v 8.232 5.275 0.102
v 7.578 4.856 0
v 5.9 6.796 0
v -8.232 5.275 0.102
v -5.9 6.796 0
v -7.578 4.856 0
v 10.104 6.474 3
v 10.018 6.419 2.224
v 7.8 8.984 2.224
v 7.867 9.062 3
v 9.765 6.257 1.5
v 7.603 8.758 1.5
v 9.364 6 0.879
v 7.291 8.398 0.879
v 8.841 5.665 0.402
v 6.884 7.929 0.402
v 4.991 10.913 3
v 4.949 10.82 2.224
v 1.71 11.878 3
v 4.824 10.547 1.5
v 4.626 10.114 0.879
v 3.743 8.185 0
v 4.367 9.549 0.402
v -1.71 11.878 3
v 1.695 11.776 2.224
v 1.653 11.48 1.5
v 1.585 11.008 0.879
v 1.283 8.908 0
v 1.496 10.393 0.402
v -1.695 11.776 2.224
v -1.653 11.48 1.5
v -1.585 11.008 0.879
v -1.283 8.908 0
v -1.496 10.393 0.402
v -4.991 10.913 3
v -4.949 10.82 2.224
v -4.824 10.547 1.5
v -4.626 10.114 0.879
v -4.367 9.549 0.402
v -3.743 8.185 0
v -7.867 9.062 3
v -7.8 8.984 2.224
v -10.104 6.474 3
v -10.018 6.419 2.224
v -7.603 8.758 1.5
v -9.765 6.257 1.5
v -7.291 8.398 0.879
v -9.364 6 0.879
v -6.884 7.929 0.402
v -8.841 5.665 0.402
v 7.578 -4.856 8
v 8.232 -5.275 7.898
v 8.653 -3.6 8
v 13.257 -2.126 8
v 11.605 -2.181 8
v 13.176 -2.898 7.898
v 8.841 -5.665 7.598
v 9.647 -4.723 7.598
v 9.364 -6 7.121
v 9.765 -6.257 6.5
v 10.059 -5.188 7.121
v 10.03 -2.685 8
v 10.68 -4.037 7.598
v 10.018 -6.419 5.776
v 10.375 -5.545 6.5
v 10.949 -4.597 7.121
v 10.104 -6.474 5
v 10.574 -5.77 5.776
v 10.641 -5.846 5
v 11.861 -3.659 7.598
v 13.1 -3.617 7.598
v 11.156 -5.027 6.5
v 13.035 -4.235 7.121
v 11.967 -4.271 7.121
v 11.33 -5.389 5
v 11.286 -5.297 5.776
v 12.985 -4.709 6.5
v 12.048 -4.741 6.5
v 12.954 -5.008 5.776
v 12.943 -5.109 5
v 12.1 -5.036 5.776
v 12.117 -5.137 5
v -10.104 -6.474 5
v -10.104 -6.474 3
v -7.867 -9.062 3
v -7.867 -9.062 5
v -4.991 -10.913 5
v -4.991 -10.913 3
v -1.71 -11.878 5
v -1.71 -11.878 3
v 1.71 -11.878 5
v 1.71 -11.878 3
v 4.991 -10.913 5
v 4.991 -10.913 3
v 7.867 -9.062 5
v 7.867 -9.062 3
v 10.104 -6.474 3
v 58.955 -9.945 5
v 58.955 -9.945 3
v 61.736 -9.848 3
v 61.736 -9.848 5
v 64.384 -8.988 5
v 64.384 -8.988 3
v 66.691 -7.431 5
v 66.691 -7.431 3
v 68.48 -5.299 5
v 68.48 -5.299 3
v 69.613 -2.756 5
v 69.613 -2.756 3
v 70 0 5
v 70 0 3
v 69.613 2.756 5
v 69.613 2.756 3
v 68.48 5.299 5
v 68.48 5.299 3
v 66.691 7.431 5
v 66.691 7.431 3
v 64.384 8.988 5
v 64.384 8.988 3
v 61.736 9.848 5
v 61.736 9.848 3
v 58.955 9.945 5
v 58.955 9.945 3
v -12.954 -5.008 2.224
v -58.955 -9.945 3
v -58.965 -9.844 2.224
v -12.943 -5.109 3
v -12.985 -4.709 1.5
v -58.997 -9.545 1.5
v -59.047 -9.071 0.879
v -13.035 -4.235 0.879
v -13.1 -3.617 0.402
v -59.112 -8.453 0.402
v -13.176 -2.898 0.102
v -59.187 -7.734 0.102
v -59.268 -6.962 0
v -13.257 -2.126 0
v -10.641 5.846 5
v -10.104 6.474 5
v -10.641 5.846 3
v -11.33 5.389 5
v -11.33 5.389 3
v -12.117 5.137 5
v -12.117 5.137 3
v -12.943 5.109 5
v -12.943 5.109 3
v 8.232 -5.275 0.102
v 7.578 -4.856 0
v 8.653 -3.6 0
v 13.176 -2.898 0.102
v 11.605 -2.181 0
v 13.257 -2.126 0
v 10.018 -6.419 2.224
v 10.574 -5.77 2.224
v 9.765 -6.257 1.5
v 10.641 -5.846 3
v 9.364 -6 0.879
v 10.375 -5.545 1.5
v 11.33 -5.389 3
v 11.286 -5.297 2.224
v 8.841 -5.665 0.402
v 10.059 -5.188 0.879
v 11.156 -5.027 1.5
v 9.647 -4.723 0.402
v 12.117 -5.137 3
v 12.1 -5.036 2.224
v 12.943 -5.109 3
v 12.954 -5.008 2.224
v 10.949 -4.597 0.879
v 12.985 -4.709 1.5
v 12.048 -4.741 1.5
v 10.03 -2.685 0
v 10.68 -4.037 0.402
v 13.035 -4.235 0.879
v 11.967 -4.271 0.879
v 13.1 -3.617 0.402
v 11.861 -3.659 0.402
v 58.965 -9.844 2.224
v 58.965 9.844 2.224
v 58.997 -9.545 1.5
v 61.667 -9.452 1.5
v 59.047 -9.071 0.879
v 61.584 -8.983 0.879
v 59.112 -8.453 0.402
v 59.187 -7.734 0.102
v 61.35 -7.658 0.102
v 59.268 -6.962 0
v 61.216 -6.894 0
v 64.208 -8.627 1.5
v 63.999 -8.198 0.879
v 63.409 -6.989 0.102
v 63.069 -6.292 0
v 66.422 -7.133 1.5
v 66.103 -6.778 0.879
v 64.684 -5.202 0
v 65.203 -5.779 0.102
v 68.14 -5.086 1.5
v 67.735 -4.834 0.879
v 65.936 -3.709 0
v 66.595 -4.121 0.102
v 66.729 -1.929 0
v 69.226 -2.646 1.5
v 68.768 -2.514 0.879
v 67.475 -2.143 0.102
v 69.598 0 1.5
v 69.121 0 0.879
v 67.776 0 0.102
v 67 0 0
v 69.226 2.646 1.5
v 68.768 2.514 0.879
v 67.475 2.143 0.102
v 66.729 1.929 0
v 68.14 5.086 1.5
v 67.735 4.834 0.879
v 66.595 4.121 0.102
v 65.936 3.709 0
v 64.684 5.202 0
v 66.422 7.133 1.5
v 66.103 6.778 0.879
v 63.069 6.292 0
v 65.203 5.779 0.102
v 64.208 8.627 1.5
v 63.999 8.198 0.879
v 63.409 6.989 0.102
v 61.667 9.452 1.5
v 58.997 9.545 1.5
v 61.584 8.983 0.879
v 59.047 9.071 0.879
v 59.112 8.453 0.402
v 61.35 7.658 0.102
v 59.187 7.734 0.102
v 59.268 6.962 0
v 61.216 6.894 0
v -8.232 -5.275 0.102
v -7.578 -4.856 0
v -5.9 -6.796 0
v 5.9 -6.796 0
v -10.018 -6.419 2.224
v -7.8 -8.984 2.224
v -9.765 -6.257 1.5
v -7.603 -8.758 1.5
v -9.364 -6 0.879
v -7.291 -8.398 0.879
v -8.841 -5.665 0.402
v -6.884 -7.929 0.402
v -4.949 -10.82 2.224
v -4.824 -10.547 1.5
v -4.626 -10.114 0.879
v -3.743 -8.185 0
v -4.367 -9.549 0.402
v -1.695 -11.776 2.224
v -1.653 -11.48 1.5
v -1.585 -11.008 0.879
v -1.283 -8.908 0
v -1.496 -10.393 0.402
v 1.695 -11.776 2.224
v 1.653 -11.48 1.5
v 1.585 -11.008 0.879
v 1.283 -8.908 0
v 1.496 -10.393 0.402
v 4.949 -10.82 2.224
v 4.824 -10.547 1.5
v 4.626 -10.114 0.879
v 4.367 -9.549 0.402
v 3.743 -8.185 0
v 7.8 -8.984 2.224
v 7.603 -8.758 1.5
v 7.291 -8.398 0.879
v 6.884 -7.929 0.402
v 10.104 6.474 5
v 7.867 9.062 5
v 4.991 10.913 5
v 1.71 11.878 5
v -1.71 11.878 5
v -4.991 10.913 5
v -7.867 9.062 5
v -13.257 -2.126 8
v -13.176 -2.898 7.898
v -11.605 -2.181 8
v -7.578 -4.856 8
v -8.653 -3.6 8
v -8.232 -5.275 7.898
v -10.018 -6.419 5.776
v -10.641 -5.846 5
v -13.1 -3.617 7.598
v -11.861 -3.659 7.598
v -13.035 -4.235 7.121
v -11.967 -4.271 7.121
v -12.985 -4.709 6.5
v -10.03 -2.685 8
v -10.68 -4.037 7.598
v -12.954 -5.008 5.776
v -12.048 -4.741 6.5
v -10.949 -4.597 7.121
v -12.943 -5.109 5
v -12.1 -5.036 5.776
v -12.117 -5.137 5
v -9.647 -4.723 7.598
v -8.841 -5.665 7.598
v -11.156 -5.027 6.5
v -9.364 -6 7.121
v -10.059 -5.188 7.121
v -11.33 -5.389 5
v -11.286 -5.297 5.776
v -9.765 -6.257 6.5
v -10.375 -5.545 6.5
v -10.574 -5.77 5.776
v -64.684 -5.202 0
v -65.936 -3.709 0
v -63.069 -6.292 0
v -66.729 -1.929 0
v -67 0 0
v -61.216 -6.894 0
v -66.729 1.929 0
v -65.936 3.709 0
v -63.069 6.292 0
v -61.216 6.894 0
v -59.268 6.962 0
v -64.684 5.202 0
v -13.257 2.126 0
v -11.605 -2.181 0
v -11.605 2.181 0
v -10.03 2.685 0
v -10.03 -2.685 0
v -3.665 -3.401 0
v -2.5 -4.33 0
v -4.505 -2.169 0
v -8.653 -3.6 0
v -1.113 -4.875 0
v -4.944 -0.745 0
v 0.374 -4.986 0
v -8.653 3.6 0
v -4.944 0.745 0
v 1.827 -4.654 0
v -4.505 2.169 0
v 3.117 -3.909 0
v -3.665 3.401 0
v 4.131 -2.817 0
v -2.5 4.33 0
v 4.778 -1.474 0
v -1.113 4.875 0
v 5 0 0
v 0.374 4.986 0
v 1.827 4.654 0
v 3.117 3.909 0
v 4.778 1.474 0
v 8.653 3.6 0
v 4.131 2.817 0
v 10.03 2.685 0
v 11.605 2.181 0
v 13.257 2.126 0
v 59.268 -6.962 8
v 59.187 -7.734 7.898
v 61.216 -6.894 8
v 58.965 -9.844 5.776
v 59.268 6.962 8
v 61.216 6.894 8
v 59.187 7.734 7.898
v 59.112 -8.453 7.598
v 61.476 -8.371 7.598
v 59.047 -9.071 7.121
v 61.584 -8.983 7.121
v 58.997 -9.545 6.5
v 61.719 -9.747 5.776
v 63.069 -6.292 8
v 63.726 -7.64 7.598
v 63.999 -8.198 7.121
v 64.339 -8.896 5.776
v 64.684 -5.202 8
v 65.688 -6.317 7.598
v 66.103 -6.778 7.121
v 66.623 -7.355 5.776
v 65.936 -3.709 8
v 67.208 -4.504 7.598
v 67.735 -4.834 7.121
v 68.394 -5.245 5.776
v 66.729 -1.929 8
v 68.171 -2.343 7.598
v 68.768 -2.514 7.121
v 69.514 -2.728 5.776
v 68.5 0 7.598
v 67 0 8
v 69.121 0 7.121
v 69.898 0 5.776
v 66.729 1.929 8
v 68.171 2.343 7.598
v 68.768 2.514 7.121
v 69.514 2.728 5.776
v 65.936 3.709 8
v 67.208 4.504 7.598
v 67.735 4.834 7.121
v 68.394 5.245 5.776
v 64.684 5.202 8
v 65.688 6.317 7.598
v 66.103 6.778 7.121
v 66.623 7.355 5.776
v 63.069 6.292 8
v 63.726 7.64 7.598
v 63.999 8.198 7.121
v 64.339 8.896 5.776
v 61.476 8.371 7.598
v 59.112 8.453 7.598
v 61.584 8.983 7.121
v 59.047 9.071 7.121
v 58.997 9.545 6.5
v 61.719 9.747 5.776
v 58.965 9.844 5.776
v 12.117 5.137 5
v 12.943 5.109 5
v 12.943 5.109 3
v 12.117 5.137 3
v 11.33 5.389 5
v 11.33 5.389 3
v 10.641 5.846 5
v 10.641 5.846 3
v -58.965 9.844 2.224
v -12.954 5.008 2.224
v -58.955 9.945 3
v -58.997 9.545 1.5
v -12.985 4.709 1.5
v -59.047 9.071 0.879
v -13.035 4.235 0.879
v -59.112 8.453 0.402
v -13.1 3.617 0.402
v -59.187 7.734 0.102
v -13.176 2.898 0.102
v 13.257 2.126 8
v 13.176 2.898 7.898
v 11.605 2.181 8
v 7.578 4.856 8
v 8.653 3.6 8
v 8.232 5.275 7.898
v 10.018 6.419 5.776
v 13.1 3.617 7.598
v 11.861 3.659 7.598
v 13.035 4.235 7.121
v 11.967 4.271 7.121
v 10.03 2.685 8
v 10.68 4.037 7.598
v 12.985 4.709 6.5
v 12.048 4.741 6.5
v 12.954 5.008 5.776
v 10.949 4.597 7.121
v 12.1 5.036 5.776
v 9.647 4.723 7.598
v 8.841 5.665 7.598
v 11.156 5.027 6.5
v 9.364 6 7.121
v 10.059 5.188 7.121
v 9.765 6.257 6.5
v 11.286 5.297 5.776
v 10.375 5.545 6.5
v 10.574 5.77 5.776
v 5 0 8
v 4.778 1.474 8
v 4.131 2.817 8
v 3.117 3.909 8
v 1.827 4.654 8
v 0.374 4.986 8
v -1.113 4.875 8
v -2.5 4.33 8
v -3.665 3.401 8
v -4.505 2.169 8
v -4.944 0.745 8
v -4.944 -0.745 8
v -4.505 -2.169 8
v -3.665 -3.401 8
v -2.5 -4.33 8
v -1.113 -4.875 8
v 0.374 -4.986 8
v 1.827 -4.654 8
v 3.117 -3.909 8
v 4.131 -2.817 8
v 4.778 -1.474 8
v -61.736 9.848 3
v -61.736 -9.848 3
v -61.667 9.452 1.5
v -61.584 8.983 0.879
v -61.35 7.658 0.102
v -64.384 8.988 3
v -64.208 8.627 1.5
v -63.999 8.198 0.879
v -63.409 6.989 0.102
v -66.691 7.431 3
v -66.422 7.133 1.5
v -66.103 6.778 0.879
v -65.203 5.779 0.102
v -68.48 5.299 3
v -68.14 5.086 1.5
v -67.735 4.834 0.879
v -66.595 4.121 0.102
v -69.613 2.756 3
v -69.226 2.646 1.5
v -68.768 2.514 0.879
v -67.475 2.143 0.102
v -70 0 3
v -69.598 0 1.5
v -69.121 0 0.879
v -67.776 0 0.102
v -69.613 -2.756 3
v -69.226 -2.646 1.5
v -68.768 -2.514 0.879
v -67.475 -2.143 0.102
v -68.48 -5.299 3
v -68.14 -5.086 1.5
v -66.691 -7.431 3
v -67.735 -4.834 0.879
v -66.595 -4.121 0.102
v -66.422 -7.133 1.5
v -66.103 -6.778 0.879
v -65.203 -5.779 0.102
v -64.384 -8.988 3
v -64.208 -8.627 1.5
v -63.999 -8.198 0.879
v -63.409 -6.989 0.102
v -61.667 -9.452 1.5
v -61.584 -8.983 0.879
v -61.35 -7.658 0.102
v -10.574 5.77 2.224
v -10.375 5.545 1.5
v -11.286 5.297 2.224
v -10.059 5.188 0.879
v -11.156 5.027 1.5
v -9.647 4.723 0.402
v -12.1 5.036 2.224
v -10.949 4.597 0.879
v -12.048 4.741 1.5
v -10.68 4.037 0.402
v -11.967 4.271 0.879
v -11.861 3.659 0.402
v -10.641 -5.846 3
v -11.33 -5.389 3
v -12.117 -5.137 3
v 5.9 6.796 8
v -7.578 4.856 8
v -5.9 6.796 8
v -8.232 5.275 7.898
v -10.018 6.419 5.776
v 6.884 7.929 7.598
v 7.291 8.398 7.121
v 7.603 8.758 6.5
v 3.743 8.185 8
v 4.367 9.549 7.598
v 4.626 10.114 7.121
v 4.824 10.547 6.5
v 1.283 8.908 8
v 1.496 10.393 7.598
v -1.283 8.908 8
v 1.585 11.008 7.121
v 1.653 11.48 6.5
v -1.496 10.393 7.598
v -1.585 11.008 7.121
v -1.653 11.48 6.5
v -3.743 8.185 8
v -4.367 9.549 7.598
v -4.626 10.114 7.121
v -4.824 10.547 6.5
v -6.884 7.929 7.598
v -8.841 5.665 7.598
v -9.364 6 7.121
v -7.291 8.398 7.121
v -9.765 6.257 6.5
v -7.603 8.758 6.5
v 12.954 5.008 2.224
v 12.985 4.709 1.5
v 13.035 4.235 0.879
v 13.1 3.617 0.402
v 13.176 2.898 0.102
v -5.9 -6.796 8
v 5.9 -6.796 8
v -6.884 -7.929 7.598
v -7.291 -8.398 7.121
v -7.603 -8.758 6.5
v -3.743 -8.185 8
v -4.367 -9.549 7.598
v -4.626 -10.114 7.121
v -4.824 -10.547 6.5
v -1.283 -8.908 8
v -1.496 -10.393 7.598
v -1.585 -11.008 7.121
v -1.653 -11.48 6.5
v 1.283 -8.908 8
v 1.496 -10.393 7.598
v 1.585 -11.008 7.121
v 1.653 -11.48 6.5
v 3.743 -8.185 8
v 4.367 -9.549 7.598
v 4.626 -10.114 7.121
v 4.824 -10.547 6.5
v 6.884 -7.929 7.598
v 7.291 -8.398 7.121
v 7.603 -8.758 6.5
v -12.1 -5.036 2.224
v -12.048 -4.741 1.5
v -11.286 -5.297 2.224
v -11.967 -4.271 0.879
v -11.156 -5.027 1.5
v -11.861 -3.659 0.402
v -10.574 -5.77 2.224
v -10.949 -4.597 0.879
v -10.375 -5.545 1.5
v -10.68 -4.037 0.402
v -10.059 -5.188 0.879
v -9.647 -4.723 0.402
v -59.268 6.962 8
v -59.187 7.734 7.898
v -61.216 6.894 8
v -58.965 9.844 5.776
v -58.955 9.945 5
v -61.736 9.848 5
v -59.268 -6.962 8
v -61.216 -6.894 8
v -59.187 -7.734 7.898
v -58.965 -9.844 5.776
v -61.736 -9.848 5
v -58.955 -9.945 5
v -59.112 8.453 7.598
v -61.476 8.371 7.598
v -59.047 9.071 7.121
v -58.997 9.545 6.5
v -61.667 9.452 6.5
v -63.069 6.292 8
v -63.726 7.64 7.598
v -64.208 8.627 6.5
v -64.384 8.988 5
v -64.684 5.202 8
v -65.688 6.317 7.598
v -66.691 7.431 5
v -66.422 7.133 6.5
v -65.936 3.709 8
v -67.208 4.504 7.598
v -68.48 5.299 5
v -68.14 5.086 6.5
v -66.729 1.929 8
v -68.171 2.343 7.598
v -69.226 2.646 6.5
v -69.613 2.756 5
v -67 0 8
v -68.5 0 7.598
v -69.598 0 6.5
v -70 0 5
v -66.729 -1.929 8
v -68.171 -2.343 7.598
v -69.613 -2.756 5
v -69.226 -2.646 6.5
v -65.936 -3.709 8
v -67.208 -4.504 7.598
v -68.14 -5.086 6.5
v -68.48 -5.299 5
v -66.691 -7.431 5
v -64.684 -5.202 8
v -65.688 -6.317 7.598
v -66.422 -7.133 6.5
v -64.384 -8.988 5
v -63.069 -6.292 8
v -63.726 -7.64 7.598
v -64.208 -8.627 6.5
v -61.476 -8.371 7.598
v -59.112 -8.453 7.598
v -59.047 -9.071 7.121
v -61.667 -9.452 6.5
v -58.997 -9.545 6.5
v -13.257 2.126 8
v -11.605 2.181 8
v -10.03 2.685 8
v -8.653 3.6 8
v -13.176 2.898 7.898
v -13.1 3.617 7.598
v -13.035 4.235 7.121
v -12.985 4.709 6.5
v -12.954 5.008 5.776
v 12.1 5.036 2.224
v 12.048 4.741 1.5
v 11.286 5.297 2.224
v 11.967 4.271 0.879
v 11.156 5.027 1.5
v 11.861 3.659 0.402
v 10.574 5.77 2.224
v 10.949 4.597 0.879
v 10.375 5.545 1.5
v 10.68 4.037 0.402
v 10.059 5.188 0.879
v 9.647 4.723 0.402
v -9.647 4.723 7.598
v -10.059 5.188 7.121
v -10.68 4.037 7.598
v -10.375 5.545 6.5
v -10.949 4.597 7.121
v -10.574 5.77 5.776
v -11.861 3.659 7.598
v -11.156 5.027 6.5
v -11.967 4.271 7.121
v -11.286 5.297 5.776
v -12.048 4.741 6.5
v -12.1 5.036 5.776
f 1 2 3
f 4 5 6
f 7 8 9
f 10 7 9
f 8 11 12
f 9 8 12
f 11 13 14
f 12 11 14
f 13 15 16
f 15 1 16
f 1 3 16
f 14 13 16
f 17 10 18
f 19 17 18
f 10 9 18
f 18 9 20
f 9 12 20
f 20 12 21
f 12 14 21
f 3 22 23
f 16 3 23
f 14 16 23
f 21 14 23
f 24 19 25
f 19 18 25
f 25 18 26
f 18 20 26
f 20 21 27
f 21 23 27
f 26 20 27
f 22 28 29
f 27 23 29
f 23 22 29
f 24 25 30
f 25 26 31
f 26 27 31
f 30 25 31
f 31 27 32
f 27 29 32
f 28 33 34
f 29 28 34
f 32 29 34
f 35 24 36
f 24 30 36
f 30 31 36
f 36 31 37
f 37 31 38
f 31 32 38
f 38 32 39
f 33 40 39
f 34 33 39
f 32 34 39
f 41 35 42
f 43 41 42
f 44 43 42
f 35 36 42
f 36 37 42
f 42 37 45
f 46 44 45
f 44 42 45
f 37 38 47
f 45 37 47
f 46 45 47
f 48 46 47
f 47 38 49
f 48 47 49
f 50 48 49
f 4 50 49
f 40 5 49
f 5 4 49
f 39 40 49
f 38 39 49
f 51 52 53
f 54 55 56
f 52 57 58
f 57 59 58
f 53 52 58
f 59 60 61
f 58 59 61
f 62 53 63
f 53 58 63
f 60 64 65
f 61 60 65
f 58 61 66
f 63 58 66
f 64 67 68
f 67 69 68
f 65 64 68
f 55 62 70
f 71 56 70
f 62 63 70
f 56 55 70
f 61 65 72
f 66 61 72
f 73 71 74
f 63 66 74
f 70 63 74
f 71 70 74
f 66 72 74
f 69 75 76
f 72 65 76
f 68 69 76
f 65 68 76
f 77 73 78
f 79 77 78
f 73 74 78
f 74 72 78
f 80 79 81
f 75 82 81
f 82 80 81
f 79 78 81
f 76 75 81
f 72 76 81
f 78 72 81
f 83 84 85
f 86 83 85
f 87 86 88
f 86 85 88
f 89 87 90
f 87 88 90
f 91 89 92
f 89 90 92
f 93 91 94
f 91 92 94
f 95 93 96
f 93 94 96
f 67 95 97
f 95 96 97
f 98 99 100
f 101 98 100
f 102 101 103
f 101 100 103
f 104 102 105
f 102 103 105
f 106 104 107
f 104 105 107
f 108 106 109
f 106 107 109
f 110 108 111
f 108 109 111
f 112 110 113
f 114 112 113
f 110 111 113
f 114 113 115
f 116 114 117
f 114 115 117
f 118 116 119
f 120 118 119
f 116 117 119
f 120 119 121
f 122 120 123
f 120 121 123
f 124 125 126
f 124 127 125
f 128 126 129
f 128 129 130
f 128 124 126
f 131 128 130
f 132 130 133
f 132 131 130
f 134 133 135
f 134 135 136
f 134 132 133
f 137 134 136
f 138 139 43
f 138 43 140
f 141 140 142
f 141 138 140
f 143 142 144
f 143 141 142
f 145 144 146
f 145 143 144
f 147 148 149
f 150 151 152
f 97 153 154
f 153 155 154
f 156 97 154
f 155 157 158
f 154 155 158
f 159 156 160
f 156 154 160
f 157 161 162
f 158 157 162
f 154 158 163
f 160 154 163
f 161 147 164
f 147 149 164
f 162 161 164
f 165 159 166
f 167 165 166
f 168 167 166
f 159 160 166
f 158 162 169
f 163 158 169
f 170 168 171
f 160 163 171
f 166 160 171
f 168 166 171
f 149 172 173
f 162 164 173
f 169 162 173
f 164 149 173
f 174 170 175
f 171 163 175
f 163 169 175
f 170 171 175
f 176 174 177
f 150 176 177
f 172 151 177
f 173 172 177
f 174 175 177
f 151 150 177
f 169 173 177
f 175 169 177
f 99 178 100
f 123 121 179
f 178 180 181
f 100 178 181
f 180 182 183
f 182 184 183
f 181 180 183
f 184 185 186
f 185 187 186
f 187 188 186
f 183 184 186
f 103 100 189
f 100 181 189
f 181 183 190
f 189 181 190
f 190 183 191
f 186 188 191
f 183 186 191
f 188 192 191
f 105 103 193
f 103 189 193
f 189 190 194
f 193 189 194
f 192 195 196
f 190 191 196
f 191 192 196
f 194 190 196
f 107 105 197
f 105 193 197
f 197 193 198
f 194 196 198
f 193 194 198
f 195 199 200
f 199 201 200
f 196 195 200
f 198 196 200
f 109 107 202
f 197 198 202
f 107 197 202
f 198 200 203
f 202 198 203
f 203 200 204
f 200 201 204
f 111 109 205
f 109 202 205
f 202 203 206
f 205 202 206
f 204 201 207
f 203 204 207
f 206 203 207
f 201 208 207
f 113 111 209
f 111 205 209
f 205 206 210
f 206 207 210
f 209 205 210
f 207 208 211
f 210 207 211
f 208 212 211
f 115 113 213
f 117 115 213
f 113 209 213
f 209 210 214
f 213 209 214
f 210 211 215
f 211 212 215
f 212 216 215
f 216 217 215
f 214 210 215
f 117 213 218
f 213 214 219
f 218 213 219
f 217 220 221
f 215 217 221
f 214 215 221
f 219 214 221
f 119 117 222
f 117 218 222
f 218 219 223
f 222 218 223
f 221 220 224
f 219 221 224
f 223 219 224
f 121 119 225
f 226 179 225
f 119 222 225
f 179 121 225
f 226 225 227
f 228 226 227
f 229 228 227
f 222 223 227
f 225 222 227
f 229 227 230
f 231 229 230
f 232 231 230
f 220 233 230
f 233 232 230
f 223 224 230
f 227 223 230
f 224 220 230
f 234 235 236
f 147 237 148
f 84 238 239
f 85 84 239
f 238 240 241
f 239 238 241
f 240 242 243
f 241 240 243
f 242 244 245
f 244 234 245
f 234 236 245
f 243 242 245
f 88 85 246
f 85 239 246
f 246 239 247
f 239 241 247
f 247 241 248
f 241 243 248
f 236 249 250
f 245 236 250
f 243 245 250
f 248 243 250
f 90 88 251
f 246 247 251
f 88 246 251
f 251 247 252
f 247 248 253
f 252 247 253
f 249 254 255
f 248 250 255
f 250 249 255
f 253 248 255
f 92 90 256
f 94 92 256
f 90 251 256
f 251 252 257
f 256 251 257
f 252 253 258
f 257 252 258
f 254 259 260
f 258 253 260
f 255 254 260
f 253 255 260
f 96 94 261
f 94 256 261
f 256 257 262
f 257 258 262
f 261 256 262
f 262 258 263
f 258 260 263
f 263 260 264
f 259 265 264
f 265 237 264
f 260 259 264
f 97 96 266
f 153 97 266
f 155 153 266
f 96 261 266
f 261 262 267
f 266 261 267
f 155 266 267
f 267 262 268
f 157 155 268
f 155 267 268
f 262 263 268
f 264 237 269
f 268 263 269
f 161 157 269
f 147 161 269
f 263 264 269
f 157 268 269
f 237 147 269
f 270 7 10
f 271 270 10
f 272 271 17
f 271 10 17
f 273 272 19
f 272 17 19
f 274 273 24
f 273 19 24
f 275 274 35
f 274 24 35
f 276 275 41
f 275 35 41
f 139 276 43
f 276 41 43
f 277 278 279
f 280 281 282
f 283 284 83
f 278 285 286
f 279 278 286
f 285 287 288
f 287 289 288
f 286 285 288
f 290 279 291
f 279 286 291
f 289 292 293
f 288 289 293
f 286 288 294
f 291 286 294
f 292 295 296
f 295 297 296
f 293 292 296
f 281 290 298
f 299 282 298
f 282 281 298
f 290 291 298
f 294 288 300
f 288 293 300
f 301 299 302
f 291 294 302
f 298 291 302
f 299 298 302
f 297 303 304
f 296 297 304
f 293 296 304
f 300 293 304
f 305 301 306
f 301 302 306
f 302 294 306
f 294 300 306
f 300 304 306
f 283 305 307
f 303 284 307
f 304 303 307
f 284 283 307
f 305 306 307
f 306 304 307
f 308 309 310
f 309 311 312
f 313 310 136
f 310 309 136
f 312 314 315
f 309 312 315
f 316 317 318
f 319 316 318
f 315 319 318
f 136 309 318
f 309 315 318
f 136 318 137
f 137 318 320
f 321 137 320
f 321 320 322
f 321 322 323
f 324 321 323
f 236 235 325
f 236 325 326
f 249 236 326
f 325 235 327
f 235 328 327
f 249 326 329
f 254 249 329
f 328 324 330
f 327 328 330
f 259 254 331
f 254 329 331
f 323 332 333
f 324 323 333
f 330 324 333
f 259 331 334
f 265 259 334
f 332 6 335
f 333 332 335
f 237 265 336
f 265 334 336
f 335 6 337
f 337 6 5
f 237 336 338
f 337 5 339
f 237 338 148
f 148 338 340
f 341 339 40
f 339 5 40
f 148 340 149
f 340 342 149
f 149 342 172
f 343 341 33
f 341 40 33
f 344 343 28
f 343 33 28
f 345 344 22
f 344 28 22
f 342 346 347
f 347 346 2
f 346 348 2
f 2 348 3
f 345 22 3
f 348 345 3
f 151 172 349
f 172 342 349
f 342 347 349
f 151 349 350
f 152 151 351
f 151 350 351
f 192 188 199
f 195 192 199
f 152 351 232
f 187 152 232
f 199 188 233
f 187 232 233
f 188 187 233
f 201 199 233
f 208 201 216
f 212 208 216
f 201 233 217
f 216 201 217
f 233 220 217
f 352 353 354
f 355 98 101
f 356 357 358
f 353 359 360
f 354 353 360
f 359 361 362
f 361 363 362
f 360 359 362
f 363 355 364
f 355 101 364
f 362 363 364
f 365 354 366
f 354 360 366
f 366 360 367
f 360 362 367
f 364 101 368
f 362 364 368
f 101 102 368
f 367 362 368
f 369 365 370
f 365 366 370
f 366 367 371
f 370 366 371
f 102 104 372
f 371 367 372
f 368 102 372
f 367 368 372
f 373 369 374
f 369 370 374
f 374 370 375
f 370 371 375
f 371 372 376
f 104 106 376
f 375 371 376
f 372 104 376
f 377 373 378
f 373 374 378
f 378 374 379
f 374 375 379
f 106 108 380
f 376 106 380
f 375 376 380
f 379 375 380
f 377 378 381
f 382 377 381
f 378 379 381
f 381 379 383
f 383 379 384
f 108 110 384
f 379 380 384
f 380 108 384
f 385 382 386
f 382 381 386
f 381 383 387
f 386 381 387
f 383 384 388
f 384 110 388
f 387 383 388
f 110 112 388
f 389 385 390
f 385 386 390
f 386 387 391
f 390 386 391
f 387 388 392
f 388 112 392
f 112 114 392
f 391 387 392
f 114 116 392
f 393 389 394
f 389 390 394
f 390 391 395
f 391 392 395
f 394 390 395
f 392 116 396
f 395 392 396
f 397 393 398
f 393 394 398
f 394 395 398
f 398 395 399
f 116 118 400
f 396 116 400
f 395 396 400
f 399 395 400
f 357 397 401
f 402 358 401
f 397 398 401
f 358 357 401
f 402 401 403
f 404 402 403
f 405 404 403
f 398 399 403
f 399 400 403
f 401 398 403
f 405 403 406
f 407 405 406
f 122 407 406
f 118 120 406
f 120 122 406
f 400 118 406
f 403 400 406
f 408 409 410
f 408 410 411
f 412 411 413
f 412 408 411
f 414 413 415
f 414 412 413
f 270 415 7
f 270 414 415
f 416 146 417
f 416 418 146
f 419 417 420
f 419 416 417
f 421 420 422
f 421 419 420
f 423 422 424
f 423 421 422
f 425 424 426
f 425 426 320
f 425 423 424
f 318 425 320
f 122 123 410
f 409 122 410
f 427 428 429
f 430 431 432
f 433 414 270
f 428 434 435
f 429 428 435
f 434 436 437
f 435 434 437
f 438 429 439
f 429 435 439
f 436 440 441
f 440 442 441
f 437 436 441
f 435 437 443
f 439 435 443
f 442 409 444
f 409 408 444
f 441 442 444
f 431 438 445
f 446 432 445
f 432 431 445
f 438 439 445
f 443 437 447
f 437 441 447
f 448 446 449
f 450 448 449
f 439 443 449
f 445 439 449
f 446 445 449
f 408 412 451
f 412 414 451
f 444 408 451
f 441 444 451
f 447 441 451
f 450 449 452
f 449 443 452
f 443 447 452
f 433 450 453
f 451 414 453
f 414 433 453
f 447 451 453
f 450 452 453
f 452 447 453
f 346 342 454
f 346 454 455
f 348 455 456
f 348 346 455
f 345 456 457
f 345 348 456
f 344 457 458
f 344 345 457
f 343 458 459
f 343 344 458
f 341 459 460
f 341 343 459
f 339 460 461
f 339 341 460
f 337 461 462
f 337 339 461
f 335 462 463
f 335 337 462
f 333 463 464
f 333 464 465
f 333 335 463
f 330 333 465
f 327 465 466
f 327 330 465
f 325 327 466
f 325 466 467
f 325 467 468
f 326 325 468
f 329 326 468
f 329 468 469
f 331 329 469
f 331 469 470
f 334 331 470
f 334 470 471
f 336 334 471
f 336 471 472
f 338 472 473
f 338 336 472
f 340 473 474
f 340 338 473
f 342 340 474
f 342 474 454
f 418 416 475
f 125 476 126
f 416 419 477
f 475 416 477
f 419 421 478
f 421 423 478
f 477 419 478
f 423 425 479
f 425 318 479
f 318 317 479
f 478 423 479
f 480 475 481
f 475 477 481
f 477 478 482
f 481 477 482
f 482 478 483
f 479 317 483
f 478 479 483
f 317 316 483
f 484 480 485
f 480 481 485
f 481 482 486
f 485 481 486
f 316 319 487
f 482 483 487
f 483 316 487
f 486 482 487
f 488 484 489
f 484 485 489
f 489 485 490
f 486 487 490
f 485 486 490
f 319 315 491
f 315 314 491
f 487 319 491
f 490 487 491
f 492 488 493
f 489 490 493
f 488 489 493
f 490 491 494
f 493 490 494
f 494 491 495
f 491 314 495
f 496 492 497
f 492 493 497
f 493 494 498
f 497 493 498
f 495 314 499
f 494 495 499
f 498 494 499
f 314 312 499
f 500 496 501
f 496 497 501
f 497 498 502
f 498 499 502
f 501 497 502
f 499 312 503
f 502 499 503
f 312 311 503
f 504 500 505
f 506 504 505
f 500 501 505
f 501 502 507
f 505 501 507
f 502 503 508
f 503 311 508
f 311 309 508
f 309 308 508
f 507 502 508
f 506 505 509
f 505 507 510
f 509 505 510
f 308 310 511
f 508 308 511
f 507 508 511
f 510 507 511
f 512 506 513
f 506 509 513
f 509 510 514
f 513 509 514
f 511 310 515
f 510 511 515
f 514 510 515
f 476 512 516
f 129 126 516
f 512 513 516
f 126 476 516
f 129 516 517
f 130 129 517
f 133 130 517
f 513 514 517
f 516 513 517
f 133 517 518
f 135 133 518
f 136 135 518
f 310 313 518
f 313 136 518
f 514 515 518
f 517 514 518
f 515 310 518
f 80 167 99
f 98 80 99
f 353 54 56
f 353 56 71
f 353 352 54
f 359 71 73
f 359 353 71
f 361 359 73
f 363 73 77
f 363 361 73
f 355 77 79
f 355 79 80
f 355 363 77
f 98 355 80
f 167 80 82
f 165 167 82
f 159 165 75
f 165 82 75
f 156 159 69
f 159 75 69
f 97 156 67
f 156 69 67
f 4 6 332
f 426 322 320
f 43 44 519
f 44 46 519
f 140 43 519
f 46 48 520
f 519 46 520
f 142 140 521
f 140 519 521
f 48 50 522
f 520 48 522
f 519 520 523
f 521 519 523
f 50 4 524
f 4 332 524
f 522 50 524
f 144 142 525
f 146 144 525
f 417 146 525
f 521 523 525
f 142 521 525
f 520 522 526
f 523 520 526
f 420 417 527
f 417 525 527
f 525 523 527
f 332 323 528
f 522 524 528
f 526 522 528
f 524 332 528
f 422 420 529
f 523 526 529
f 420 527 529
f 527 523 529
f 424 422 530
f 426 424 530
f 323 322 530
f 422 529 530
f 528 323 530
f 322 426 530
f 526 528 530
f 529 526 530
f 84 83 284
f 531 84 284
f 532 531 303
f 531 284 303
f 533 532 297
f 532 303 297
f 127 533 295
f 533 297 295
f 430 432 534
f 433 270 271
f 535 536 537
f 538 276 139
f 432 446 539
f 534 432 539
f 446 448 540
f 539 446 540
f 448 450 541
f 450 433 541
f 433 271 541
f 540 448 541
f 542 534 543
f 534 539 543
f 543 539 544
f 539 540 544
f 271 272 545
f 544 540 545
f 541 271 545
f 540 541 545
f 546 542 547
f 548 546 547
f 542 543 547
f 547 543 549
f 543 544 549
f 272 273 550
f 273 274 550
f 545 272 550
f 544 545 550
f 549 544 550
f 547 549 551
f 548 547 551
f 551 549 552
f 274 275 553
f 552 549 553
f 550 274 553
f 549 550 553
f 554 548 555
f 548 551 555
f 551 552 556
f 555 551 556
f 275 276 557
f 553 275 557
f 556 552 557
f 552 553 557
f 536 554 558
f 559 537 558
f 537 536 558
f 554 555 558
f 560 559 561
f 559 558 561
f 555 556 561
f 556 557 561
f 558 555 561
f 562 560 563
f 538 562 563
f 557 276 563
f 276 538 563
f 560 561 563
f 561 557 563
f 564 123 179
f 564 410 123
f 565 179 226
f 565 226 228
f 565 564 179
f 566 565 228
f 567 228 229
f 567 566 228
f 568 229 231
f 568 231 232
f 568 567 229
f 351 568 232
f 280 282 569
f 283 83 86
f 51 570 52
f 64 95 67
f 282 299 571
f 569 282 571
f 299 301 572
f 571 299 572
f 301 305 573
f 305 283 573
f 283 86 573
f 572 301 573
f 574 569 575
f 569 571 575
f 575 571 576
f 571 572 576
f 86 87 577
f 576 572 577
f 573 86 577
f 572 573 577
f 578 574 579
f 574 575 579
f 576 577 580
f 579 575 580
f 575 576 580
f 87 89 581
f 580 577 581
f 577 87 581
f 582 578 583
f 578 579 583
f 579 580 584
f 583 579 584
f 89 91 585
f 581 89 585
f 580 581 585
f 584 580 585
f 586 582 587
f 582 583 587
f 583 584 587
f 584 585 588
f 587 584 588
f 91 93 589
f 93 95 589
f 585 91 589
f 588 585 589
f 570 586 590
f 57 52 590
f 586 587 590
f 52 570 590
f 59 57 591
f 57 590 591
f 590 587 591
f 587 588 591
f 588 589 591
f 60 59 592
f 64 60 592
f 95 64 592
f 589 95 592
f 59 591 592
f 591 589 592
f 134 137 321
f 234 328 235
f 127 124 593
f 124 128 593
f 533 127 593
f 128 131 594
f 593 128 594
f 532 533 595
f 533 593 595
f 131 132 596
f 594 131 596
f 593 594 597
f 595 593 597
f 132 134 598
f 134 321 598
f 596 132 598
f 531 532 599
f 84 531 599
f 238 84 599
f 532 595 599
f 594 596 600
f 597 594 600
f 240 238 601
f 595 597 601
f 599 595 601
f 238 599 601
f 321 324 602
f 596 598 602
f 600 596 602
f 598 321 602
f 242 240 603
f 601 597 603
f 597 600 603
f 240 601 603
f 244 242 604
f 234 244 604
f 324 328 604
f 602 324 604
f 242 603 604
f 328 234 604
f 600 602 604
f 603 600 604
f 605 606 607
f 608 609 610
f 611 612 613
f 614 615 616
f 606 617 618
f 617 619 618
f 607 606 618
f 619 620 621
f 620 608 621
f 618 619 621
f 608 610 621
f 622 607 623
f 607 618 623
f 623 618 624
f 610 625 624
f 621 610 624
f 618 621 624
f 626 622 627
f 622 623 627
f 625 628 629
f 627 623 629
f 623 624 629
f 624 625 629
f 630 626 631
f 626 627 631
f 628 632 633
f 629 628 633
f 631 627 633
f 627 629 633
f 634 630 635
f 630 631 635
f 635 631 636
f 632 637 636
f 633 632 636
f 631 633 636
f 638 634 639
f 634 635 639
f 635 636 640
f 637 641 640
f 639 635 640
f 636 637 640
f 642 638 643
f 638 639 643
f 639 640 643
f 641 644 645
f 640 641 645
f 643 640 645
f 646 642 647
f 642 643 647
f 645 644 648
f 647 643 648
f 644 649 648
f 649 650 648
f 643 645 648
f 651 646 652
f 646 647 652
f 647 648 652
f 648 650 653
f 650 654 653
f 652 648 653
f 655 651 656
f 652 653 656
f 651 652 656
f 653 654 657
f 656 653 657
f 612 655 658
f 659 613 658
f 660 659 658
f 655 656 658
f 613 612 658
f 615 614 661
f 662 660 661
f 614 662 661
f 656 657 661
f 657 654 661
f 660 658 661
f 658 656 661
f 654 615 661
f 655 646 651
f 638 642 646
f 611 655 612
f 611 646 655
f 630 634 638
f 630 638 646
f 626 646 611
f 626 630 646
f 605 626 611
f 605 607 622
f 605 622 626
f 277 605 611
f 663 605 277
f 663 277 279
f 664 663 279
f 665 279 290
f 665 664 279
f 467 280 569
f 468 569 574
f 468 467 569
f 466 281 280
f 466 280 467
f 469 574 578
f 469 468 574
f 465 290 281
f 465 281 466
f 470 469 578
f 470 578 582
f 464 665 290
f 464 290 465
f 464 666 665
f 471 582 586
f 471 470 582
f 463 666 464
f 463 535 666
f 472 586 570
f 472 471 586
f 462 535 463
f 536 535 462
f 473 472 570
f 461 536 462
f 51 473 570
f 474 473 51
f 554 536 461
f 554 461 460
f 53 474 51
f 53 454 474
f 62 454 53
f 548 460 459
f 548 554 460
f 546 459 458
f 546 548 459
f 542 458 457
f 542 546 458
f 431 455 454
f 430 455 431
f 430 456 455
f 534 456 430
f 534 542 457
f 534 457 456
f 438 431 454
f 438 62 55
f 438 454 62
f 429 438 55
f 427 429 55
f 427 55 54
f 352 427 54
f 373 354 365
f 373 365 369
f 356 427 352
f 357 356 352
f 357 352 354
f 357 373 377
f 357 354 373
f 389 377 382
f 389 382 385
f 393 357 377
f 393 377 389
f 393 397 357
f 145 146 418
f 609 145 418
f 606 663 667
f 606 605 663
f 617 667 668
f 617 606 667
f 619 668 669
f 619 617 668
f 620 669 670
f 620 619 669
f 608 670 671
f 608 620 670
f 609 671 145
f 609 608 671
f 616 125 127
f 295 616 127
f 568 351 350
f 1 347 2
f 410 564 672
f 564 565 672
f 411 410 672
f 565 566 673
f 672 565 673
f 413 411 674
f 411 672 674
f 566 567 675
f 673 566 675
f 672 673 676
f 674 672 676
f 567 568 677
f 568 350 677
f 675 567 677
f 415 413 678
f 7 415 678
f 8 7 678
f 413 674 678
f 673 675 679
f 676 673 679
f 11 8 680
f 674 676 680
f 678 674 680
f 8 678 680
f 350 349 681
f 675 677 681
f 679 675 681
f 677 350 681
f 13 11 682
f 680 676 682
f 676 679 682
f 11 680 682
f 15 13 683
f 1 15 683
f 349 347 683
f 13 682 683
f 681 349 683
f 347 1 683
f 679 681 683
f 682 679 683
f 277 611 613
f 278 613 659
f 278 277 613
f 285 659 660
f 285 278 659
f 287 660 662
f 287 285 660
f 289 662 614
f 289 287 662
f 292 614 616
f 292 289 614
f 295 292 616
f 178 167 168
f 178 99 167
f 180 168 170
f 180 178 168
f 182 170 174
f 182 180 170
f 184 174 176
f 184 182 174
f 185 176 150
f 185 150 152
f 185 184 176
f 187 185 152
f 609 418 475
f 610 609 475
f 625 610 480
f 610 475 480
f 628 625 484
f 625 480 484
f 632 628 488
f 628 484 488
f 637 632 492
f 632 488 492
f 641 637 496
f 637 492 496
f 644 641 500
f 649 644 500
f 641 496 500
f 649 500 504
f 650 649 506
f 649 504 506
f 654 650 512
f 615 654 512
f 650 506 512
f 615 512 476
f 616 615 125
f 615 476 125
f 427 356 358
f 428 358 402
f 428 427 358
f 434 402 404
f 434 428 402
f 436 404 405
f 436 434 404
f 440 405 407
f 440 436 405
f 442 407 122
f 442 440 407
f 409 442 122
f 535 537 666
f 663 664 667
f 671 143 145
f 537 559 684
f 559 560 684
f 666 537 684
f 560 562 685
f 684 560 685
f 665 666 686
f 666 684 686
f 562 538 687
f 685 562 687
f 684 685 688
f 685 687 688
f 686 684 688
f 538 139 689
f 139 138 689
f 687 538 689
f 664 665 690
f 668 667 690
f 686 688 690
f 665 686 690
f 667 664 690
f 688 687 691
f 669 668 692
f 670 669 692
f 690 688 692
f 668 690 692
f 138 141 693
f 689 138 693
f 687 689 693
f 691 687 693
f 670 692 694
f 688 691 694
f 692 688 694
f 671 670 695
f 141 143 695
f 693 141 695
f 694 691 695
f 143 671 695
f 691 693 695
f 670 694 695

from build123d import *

# Parameters (mm, degrees)
SKETCH_1_R      = 5
EXTRUDE_1_DEPTH = 8
FILLET_1_R      = 3
FILLET_2_R      = 3
FILLET_3_R      = 3


with BuildPart() as part:
    # 草圖1 → 填料-伸長1 (new body)
    with BuildSketch(Plane.XY):
        with BuildLine():
            Line((58.954715367, 9.945218954), (10.953934927, 4.900133633))
            ThreePointArc((10.953934927, 4.900133633), (0, 12), (-10.953934927, 4.900133633))
            Line((-10.953934927, 4.900133633), (-58.954715367, 9.945218954))
            ThreePointArc((-58.954715367, 9.945218954), (-70, 0), (-58.954715367, -9.945218954))
            Line((-58.954715367, -9.945218954), (-10.953934927, -4.900133633))
            ThreePointArc((-10.953934927, -4.900133633), (0, -12), (10.953934927, -4.900133633))
            Line((10.953934927, -4.900133633), (58.954715367, -9.945218954))
            ThreePointArc((58.954715367, -9.945218954), (70, 0), (58.954715367, 9.945218954))
        make_face()
        Circle(SKETCH_1_R, mode=Mode.SUBTRACT)
    extrude(amount=EXTRUDE_1_DEPTH)

    # 圓角1
    fillet_1_edges = [part.edges().sort_by_distance(p)[0] for p in [
        (10.953934927, -4.900133633, 4),
        (-10.953934927, -4.900133633, 4),
        (-10.953934927, 4.900133633, 4),
        (10.953934927, 4.900133633, 4),
    ]]
    fillet(fillet_1_edges, radius=FILLET_1_R)

    # 圓角2
    fillet_2_edges = [part.edges().sort_by_distance(p)[0] for p in [
        (-70, 0, 8),
        (-35.948953134, -7.527215907, 8),
        (-35.948953134, 7.527215907, 8),
        (0, 12, 8),
        (0, -12, 8),
        (35.948953134, -7.527215907, 8),
        (-11.32982846, 5.388970193, 8),
        (-11.32982846, -5.388970193, 8),
        (11.32982846, -5.388970193, 8),
        (11.32982846, 5.388970193, 8),
        (70, 0, 8),
        (35.948953134, 7.527215907, 8),
    ]]
    fillet(fillet_2_edges, radius=FILLET_2_R)

    # 圓角3
    fillet_3_edges = [part.edges().sort_by_distance(p)[0] for p in [
        (35.948953134, 7.527215907, 0),
        (70, 0, 0),
        (-35.948953134, 7.527215907, 0),
        (0, 12, 0),
        (0, -12, 0),
        (35.948953134, -7.527215907, 0),
        (-11.32982846, 5.388970193, 0),
        (-11.32982846, -5.388970193, 0),
        (11.32982846, -5.388970193, 0),
        (11.32982846, 5.388970193, 0),
        (-35.948953134, -7.527215907, 0),
        (-70, 0, 0),
    ]]
    fillet(fillet_3_edges, radius=FILLET_3_R)


solid = part.part
